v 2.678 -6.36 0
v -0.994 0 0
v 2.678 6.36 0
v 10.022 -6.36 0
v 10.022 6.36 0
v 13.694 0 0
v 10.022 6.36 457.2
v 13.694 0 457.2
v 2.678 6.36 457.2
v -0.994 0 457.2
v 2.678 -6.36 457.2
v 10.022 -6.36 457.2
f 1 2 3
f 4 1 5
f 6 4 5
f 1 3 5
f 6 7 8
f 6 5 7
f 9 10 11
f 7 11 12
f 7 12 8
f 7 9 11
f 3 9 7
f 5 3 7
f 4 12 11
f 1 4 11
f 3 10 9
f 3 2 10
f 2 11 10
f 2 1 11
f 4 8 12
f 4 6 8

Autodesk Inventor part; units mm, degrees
ref_plane "YZ Plane" through (0, 0, 0) normal (1, 0, 0) x (0, 1, 0)
ref_plane "XZ Plane" through (0, 0, 0) normal (0, 1, 0) x (-1, 0, 0)
ref_plane "XY Plane" through (0, 0, 0) normal (0, 0, 1) x (1, 0, 0)
sketch "Sketch1" plane through (0, 0, 0) normal (0, 0, 1) x (1, 0, 0)
  line L0 (2.6781, 6.36) -> (10.0219, 6.36) projected
  line L1 (-0.9939, 0) -> (2.6781, 6.36) projected
  line L2 (2.6781, -6.36) -> (-0.9939, 0) projected
  line L3 (10.0219, -6.36) -> (2.6781, -6.36) projected
  line L4 (13.6939, 0) -> (10.0219, -6.36) projected
  line L5 (10.0219, 6.36) -> (13.6939, 0) projected
  point P0 (0, 0)
extrude "Extrusion1" add sketch "Sketch1" along normal blind 457.2
properties part number "bigShaft2"
